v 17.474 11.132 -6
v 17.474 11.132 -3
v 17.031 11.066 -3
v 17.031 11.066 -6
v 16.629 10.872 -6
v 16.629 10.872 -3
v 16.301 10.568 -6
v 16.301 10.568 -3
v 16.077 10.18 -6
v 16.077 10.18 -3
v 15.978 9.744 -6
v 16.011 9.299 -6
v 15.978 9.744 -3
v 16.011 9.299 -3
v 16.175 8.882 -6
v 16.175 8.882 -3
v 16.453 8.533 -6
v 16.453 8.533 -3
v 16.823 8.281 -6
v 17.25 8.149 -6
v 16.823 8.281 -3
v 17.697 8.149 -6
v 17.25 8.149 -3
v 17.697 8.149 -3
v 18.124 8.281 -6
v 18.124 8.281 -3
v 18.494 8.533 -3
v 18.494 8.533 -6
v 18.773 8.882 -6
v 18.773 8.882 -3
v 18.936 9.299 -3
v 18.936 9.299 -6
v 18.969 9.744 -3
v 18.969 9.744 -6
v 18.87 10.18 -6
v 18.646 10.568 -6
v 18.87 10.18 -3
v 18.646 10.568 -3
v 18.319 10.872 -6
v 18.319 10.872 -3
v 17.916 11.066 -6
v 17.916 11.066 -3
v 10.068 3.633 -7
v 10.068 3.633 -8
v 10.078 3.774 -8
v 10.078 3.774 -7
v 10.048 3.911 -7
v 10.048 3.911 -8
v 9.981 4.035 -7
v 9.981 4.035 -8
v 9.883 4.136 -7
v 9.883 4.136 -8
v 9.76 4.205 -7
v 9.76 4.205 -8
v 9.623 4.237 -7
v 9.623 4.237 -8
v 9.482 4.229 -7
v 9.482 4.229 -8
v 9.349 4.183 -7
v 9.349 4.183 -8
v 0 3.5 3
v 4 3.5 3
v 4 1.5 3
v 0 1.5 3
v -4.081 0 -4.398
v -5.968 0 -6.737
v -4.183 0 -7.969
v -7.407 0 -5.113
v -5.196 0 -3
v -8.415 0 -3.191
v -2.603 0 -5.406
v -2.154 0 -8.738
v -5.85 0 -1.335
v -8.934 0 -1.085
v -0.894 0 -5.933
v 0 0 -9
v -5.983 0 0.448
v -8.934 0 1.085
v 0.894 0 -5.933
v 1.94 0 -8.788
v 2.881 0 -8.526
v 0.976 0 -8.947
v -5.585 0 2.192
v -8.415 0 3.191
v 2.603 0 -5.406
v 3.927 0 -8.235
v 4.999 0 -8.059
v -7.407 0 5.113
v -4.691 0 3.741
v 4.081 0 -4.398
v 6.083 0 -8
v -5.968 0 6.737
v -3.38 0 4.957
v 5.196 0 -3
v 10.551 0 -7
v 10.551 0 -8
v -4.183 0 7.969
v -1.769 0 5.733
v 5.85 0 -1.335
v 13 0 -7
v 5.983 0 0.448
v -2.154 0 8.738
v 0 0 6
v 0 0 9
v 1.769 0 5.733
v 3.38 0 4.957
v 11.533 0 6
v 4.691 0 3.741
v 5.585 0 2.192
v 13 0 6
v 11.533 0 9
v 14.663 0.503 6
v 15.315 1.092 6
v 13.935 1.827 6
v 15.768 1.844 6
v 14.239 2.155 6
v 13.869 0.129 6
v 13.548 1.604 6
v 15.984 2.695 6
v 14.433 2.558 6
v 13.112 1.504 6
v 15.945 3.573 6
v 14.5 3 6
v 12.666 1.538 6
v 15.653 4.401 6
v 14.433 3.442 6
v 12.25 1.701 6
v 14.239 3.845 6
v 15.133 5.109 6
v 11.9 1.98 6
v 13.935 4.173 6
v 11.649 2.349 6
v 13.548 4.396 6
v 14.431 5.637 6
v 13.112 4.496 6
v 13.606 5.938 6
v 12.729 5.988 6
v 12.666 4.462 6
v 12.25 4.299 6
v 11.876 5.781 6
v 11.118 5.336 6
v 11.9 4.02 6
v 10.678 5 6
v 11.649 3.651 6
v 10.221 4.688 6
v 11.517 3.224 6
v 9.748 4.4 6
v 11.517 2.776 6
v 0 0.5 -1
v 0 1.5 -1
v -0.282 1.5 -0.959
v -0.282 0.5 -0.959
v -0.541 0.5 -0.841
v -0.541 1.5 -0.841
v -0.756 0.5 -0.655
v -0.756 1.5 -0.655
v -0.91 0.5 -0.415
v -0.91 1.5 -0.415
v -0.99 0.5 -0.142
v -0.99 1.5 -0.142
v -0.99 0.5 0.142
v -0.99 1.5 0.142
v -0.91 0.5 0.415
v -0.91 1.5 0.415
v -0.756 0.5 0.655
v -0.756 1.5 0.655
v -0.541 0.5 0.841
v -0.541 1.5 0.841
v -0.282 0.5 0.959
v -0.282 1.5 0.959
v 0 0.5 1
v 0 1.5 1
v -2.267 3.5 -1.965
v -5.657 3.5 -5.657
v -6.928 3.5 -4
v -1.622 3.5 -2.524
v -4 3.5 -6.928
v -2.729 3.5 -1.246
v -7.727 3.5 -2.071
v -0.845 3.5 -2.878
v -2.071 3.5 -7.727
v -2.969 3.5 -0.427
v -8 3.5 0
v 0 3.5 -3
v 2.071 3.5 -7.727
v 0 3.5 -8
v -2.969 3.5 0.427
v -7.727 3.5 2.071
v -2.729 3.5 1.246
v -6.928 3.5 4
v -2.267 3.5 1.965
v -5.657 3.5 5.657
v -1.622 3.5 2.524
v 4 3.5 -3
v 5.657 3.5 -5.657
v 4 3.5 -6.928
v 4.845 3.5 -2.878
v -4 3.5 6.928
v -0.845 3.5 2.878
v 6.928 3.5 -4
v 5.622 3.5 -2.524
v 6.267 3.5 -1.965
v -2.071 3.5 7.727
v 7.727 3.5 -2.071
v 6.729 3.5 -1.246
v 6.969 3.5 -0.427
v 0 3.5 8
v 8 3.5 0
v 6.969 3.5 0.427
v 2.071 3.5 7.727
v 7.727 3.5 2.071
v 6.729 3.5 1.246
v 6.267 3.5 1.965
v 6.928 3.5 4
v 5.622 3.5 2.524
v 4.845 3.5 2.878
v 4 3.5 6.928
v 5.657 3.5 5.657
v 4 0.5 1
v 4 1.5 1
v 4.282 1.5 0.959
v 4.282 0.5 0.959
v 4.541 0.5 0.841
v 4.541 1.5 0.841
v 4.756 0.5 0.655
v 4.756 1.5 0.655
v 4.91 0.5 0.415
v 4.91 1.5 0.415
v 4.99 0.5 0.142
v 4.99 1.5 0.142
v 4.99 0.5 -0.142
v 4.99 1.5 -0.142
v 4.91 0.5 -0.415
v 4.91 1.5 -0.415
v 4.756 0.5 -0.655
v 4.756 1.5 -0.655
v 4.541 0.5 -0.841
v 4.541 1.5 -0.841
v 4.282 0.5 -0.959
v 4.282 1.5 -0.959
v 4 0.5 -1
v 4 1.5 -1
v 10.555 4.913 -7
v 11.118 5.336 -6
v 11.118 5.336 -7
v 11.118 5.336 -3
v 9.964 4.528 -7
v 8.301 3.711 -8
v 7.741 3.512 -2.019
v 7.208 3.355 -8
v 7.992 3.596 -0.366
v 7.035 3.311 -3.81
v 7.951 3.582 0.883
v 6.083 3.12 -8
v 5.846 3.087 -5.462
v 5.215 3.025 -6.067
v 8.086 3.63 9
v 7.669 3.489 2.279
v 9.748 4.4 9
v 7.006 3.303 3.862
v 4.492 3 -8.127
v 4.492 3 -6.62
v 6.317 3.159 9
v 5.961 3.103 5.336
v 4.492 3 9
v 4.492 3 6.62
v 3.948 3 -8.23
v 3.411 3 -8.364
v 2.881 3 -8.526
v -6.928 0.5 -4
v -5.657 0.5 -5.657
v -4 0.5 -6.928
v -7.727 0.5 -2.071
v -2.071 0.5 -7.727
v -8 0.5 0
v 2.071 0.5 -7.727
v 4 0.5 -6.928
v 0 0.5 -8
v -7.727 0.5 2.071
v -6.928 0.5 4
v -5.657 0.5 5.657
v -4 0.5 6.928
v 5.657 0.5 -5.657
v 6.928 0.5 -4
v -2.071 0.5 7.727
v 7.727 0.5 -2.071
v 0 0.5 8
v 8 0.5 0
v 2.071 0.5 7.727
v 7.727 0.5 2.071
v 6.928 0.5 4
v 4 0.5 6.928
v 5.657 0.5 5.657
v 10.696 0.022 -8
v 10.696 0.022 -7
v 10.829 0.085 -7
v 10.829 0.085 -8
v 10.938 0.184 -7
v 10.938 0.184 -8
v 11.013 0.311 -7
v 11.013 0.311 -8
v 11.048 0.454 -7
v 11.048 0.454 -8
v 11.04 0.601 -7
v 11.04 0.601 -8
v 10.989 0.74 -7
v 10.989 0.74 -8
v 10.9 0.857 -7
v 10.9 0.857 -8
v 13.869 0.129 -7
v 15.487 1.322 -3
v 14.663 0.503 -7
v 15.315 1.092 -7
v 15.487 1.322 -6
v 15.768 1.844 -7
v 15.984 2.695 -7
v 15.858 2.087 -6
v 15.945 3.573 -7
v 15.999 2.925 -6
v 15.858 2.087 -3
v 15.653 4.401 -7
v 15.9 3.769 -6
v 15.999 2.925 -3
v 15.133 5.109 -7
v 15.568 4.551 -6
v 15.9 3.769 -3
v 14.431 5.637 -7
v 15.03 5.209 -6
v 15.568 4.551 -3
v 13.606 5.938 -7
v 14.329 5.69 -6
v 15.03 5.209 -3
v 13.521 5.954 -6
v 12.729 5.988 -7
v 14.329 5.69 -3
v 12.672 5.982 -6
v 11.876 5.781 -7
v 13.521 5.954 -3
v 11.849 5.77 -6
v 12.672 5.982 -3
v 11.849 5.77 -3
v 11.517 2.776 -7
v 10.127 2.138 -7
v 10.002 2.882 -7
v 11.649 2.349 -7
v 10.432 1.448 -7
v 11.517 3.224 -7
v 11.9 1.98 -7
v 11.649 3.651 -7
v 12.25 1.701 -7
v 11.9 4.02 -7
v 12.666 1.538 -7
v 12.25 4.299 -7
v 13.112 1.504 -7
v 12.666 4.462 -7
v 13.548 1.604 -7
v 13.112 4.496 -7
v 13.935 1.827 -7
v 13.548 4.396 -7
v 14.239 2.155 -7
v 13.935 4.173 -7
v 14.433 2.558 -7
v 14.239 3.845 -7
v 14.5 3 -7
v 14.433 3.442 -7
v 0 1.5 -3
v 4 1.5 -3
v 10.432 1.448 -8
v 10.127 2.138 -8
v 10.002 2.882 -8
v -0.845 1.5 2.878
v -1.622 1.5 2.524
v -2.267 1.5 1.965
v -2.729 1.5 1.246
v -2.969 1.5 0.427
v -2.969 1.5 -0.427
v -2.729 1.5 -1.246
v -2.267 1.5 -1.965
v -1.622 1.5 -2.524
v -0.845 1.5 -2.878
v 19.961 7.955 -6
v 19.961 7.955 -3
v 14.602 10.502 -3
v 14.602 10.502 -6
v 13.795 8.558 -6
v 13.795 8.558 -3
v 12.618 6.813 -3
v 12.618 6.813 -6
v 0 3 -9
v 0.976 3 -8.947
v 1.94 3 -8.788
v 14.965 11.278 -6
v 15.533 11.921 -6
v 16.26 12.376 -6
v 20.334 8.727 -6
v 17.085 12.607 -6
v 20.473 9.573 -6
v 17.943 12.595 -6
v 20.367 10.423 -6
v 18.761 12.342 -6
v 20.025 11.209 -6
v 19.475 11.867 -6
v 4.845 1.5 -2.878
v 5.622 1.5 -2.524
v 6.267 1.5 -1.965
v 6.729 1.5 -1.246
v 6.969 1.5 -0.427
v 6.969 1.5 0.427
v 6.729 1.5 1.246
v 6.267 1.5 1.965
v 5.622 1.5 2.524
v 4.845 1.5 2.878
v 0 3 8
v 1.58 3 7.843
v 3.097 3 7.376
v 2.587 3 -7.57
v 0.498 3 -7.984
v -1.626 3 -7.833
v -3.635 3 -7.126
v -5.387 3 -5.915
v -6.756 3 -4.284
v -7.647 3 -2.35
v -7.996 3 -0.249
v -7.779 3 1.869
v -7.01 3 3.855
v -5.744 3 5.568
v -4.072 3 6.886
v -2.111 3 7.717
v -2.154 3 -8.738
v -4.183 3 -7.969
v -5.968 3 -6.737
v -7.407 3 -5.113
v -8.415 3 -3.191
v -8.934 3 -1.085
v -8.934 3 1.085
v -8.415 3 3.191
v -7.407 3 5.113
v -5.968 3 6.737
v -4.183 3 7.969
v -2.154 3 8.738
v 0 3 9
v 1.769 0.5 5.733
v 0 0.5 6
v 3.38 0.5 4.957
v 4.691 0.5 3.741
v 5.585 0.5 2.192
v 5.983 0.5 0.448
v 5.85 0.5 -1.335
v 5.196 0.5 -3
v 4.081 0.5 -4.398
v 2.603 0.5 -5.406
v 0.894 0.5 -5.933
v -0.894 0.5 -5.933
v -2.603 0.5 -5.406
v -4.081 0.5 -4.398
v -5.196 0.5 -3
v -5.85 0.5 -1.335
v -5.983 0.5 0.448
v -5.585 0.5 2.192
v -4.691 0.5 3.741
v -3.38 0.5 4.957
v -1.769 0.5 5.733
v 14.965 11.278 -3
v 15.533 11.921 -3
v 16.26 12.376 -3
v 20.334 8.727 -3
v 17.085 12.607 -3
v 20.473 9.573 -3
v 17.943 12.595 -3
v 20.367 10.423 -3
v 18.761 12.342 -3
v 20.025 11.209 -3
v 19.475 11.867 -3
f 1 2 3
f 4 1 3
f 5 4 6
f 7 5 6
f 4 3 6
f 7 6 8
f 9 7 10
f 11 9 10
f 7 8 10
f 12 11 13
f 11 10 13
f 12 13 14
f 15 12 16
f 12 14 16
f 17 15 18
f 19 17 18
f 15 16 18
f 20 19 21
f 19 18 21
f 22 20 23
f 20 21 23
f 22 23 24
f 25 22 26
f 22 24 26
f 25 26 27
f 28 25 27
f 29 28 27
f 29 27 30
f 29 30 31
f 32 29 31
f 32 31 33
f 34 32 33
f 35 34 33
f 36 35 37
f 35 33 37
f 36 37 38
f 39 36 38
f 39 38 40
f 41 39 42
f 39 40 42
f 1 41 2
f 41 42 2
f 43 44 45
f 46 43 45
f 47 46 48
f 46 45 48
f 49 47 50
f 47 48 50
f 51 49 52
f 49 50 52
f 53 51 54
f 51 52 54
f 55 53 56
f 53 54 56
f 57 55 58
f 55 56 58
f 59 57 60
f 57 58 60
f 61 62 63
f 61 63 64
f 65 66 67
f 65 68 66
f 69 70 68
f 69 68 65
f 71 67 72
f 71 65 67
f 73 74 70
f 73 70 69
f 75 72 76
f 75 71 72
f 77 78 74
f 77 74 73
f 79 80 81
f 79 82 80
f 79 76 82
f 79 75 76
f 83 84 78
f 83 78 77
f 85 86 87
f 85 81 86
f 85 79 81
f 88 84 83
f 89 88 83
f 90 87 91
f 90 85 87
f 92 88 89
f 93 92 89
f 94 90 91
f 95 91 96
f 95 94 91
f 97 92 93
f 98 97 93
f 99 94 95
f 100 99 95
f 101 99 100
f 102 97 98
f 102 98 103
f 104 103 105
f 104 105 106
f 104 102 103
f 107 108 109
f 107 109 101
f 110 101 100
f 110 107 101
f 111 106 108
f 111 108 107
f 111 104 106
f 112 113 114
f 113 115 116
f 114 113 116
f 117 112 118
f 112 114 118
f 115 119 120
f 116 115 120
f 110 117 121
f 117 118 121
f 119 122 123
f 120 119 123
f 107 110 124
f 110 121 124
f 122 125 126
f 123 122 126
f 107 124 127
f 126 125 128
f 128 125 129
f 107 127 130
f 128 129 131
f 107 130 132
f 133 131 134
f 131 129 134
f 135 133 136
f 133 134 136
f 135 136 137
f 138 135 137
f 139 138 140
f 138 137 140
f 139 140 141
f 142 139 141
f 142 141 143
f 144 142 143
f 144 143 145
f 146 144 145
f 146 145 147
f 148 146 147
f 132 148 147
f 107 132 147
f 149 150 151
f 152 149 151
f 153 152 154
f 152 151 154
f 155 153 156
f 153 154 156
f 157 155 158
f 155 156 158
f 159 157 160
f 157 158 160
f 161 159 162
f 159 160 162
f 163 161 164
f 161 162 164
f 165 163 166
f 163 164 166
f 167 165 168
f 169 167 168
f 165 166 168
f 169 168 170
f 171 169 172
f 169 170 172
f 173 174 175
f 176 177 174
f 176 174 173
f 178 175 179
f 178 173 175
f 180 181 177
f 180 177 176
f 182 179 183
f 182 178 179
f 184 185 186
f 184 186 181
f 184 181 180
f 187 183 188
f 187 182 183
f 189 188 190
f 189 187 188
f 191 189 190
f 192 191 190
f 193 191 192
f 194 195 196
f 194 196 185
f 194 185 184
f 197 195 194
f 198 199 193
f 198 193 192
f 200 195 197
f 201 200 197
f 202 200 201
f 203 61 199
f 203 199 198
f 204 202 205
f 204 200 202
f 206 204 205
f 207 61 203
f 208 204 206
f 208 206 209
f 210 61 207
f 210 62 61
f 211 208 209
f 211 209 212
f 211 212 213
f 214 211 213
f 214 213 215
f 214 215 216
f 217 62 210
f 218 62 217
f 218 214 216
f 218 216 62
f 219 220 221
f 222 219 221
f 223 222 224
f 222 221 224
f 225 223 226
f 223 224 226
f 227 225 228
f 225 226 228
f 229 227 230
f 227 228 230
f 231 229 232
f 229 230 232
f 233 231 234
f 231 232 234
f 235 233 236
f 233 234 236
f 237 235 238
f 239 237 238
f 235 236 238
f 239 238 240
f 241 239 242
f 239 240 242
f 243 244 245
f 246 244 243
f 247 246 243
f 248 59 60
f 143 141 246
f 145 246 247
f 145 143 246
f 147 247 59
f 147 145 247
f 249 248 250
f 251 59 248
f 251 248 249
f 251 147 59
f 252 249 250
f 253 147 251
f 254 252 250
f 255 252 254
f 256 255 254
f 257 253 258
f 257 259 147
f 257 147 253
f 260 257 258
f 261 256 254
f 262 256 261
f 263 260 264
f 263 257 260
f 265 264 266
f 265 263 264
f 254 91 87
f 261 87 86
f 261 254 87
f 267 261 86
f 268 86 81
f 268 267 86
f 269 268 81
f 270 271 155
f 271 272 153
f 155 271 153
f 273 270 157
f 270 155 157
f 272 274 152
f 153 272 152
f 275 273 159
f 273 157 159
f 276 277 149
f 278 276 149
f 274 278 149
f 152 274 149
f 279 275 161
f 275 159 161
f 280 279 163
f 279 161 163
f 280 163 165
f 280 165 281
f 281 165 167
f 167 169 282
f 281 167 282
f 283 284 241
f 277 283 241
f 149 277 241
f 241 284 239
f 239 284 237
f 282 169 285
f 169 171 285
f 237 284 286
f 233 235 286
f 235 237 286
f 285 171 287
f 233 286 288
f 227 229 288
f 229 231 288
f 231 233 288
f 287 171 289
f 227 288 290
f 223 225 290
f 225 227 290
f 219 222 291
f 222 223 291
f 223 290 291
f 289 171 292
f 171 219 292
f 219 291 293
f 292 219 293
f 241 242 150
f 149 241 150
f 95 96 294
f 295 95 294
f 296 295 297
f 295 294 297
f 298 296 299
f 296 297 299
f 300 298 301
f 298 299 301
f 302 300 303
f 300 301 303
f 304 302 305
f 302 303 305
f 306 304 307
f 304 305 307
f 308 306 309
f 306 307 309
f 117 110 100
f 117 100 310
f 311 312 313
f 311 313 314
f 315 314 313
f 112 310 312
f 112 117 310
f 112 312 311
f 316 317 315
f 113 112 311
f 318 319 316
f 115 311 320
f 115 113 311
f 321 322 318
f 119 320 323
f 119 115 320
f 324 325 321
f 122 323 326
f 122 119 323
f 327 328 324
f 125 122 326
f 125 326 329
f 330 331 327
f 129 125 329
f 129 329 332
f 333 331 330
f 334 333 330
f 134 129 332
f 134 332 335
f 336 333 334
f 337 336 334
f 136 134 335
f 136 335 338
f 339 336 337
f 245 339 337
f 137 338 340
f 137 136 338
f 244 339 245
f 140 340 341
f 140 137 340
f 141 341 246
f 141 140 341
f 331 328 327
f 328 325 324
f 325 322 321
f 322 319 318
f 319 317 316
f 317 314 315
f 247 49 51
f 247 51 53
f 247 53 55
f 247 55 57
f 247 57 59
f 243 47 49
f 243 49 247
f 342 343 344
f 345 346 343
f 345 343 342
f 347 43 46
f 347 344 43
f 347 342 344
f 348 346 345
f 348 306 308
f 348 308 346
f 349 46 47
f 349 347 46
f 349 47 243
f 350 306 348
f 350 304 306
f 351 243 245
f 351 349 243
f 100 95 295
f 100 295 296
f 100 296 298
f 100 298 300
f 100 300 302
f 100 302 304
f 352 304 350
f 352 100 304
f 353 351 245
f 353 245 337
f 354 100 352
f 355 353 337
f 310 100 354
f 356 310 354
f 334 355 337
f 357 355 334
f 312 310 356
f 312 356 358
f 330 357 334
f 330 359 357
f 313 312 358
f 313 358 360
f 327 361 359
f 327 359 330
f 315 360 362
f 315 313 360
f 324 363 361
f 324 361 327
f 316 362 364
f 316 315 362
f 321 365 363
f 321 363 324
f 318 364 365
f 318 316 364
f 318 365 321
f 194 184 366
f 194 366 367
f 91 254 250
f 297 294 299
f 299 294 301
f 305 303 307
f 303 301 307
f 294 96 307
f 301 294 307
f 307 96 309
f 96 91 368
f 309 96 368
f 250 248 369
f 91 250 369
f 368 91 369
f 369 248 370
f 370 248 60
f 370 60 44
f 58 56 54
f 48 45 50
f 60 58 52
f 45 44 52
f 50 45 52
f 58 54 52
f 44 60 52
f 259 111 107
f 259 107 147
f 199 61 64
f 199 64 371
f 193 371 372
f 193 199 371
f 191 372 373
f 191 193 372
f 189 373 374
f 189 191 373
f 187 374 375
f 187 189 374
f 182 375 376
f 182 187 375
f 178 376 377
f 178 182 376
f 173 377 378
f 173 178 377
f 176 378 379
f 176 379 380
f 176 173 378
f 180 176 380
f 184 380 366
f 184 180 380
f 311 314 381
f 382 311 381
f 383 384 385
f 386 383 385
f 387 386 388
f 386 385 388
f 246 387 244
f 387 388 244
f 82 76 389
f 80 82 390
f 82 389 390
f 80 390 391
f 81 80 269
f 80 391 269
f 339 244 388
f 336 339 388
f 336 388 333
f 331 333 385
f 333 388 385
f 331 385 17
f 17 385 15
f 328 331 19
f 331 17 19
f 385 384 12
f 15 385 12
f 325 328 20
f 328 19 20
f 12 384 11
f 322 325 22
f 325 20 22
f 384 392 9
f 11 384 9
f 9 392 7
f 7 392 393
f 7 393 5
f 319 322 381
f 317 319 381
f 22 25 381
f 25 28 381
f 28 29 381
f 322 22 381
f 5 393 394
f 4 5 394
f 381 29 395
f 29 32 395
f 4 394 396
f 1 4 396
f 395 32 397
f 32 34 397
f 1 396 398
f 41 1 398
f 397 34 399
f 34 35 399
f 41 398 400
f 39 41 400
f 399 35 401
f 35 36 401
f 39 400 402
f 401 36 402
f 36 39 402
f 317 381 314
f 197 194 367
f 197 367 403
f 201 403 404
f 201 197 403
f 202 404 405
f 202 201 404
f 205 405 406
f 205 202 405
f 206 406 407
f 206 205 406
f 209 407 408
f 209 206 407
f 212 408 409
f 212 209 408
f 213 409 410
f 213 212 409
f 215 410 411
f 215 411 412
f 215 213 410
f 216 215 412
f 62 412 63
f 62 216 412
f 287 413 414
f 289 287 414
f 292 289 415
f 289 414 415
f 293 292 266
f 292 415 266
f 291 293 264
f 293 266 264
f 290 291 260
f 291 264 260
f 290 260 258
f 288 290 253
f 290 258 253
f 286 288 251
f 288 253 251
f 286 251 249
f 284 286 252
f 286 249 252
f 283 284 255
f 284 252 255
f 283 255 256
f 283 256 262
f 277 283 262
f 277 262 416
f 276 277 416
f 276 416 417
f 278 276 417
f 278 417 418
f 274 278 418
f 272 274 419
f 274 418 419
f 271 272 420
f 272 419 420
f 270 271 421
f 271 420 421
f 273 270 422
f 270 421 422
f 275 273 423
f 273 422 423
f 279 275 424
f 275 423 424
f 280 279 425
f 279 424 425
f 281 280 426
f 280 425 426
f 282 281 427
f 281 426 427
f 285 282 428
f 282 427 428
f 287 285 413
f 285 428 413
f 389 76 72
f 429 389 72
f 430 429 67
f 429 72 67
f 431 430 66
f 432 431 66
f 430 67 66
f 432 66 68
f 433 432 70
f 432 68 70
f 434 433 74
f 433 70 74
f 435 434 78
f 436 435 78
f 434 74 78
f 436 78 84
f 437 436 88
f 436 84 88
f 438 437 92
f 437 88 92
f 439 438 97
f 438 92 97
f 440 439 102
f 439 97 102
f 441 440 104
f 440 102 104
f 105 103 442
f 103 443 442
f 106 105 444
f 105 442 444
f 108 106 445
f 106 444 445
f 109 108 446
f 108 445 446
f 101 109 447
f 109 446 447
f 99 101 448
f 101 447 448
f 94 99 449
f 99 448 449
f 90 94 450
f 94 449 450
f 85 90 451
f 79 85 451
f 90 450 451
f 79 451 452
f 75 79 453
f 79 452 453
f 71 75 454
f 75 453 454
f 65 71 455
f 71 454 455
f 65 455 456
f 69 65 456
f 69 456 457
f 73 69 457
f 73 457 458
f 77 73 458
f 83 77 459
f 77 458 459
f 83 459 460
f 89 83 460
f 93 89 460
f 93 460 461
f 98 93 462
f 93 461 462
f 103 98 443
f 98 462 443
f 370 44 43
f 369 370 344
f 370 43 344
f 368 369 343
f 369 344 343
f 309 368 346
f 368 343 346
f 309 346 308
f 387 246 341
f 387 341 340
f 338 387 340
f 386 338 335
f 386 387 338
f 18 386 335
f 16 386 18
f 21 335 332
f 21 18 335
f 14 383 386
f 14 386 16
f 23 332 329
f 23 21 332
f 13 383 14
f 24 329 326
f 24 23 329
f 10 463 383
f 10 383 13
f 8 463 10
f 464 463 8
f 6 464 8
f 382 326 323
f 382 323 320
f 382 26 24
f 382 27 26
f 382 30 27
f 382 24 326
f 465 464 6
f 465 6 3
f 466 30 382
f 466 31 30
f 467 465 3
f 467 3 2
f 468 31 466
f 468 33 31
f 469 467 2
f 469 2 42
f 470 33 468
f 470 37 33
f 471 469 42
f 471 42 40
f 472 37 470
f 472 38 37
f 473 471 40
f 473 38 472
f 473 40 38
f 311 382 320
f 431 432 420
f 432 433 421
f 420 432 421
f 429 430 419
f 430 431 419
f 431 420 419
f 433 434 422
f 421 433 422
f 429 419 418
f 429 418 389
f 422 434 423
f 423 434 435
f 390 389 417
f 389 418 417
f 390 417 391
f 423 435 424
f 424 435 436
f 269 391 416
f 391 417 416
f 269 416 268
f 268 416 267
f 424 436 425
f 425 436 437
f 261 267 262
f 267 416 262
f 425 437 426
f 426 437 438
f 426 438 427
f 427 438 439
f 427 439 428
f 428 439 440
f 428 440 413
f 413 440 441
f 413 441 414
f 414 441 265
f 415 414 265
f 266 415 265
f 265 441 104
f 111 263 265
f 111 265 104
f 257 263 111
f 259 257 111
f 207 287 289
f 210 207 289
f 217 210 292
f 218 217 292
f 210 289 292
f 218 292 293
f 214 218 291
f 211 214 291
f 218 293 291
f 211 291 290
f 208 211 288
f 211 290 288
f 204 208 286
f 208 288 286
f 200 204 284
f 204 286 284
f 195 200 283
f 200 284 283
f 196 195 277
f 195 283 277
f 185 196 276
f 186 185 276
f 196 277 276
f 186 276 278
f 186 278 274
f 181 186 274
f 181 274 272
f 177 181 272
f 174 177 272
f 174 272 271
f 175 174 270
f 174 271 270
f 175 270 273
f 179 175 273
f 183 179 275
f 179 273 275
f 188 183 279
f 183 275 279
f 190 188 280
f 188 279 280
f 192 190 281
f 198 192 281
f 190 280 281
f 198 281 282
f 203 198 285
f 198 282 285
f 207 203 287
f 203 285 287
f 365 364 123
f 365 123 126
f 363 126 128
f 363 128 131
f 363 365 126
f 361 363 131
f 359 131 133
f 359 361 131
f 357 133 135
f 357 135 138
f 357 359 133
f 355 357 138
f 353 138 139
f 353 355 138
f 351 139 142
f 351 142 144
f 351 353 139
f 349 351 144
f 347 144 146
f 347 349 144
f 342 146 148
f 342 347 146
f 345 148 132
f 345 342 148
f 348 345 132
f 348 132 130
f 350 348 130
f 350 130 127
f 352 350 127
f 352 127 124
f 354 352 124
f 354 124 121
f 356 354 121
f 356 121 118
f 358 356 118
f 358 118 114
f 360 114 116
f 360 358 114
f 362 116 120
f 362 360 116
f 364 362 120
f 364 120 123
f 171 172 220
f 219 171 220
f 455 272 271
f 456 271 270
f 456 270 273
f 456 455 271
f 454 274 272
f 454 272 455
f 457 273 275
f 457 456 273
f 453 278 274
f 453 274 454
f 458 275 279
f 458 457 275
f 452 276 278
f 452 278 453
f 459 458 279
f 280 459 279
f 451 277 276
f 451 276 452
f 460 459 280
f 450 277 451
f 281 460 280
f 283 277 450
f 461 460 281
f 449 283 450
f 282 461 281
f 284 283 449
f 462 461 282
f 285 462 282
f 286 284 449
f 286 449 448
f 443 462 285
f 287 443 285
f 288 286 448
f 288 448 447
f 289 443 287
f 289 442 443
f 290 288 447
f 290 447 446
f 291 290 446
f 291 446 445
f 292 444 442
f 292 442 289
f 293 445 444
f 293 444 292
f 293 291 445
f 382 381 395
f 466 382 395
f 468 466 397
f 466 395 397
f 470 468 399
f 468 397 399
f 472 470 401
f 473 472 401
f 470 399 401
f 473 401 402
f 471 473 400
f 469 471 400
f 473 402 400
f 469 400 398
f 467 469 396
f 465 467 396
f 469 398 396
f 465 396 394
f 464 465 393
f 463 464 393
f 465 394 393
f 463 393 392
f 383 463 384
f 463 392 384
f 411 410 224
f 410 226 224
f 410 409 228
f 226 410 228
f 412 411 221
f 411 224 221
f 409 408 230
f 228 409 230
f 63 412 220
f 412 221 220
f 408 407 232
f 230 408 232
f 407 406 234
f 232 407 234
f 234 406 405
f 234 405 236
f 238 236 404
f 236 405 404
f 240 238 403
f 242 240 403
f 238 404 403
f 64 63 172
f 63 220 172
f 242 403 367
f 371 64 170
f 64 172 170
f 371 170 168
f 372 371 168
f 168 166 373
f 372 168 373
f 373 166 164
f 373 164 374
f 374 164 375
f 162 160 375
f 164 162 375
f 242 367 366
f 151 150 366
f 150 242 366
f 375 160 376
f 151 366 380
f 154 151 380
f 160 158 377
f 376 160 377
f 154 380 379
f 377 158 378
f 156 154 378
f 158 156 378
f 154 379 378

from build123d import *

# Parameters (mm, degrees)
SKETCH1_R           = 9
BOSS_EXTRUDE1_DEPTH = 3
SKETCH2_W           = 4.492348724
SKETCH2_H           = 3
BOSS_EXTRUDE2_DEPTH = 9
CUT_EXTRUDE1_DEPTH  = 8
BOSS_EXTRUDE6_START = -6
BOSS_EXTRUDE6_DEPTH = 3
FILLET1_R           = 10
SKETCH4_R           = 3
CUT_EXTRUDE2_DEPTH  = 1
SKETCH5_R           = 8
CUT_EXTRUDE3_DEPTH  = 2.5
SKETCH6_R           = 6
CUT_EXTRUDE4_DEPTH  = 2.5
CUT_EXTRUDE5_DEPTH  = 3
HOLE1_START         = -7
HOLE1_OUTLINE_R     = 1.5
HOLE1_DEPTH         = 13
SKETCH13_W          = 1.5
SKETCH13_H          = 15
SKETCH14_R          = 8
BOSS_EXTRUDE5_DEPTH = 3
CUT_EXTRUDE6_DEPTH  = 2
CUT_EXTRUDE7_DEPTH  = 2
FILLET5_R           = 0.5


with BuildPart() as part:
    # Sketch1 → Boss-Extrude1 (new body)
    with BuildSketch(Plane(origin=(0, 0, 0), x_dir=(1, 0, 0), z_dir=(0, 1, 0))):
        with Locations(Location((0, 0, 0), (0, 0, 270))):
            Circle(SKETCH1_R)
    extrude(amount=BOSS_EXTRUDE1_DEPTH)

    # Sketch2 → Boss-Extrude2 (add, symmetric)
    with BuildSketch(Plane.XY):
        with BuildLine():
            ThreePointArc((11.118241852, 5.336447362), (8.005233793, 3.601221323), (4.492348724, 3))
            Line((4.492348724, 3), (4.492348724, 0))
            Line((4.492348724, 0), (13, 0))
            ThreePointArc((13, 0), (10.170747264, 2.002338255), (11.118241852, 5.336447362))
        make_face()
        with BuildLine():
            ThreePointArc((16, 3), (14.29513041, 5.70603718), (11.118241852, 5.336447362))
            ThreePointArc((11.118241852, 5.336447362), (10.170747264, 2.002338255), (13, 0))
            ThreePointArc((13, 0), (14.408414688, 0.351157221), (15.487112718, 1.32242129))
            ThreePointArc((15.487112718, 1.32242129), (15.868914268, 2.122884886), (16, 3))
        make_face()
        with Locations((2.246174362, 1.5)):
            Rectangle(SKETCH2_W, SKETCH2_H)
    extrude(amount=BOSS_EXTRUDE2_DEPTH, both=True)

    # Sketch3 → Cut-Extrude1 (cut, symmetric)
    with BuildSketch(Plane(origin=(0, 3, 0), x_dir=(1, 0, 0), z_dir=(0, 1, 0))):
        with BuildLine():
            ThreePointArc((0, 9), (2.121320344, 8.746427842), (4.123105626, 8))
            Line((4.123105626, 8), (20.22341573, 8))
            Line((20.22341573, 8), (20.22341573, 9))
            Line((20.22341573, 9), (0, 9))
        make_face()
    extrude(amount=CUT_EXTRUDE1_DEPTH, both=True, mode=Mode.SUBTRACT)

    # Sketch2<3> → Boss-Extrude6 (add)
    with BuildSketch(Plane.XY.offset(BOSS_EXTRUDE6_START)):
        with BuildLine():
            ThreePointArc((14.602307947, 10.501787764), (13.249766942, 7.656401863), (11.118241852, 5.336447362))
            ThreePointArc((11.118241852, 5.336447362), (15.029708074, 5.20913674), (15.487112718, 1.32242129))
            Line((15.487112718, 1.32242129), (19.960655945, 7.95472187))
            ThreePointArc((19.960655945, 7.95472187), (18.761477117, 12.341770325), (14.602307947, 10.501787764))
        make_face()
    extrude(amount=BOSS_EXTRUDE6_DEPTH)

    # Fillet1
    fillet1_edges = [part.edges().sort_by_distance(p)[0] for p in [
        (4.123105626, 1.5, -8),
    ]]
    fillet(fillet1_edges, radius=FILLET1_R)

    # Sketch4 → Cut-Extrude2 (cut, symmetric)
    with BuildSketch(Plane.XY.offset(-8)):
        with Locations((13, 3)):
            Circle(SKETCH4_R)
    extrude(amount=CUT_EXTRUDE2_DEPTH, both=True, mode=Mode.SUBTRACT)

    # Sketch5 → Cut-Extrude3 (cut, symmetric)
    with BuildSketch(Plane(origin=(0, 3, 0), x_dir=(1, 0, 0), z_dir=(0, 1, 0))):
        with Locations(Location((0, 0, 0), (0, 0, 270))):
            Circle(SKETCH5_R)
    extrude(amount=CUT_EXTRUDE3_DEPTH, both=True, mode=Mode.SUBTRACT)

    # Sketch6 → Cut-Extrude4 (cut, symmetric)
    with BuildSketch(Plane(origin=(0, 0.5, 0), x_dir=(1, 0, 0), z_dir=(0, 1, 0))):
        with Locations(Location((0, 0, 0), (0, 0, 270))):
            Circle(SKETCH6_R)
    extrude(amount=CUT_EXTRUDE4_DEPTH, both=True, mode=Mode.SUBTRACT)

    # Sketch7 → Cut-Extrude5 (cut)
    with BuildSketch(Plane(origin=(0, 0, 9), x_dir=(-1, 0, 0), z_dir=(0, 0, -1))):
        with BuildLine():
            Line((-13, 0), (-11.53289423, 0))
            Line((-11.53289423, 0), (-9.747506928, 4.399961457))
            ThreePointArc((-9.747506928, 4.399961457), (-10.451299694, 4.841235284), (-11.118241854, 5.336447363))
            ThreePointArc((-11.118241854, 5.336447363), (-15.829252736, 3.997661744), (-13, 0))
        make_face()
    extrude(amount=CUT_EXTRUDE5_DEPTH, mode=Mode.SUBTRACT)

    # Hole1: read off the stored shape, not the designer's step
    # Hole1 outline → Hole1 (cut)
    with BuildSketch(Plane.XY.offset(HOLE1_START)):
        with Locations((13, 3)):
            Circle(HOLE1_OUTLINE_R)
    extrude(amount=HOLE1_DEPTH, mode=Mode.SUBTRACT)

    # Sketch13 → Ø3.0 mm Dowel Holes1 (revolve, cut)
    with BuildSketch(Plane(origin=(17.473543228, 9.63230058, -6), x_dir=(0, 1, 0), z_dir=(1, 0, 0))):
        with Locations((0.75, 7.5)):
            Rectangle(SKETCH13_W, SKETCH13_H)
    revolve(axis=Axis((17.473543228, 9.63230058, -12.35), (0, 0, 1)), mode=Mode.SUBTRACT)

    # Fillet5
    # the kernel refuses this fillet: 0.5 mm, written as the material it takes off along each edge
    with BuildSketch(Plane(origin=(13, 0, -14.123724357), x_dir=(-1, 0, 0), z_dir=(0, 0, 1))) as fillet5_piece_1:
        with BuildLine():
            CenterArc((2.449489743, -0.5), FILLET5_R, 90, 135.584691403)
            ThreePointArc((2.099562637, -0.857142857), (1.133893419, -0.222539701), (0, 0))
            Line((0, 0), (2.449489743, 0))
        make_face()
    extrude(amount=7.123724357, mode=Mode.SUBTRACT)
    with BuildSketch(Plane(origin=(11.118241852, 5.336447362, -13.280688141), x_dir=(-0.524989604384867, -0.8511086389455936, 0), z_dir=(0, 0, 1))) as fillet5_piece_2:
        with BuildLine():
            CenterArc((2.168111982, -0.471365199), FILLET5_R, 109.484734083, 129.554348195)
            ThreePointArc((1.910885347, -0.900124407), (0.977998077, -0.402179055), (0, 0))
            ThreePointArc((0, 0), (1.000667069, -0.171808808), (2.001334137, 0))
        make_face()
    extrude(amount=6.280688141, mode=Mode.SUBTRACT)


with BuildPart() as body_2:
    # Sketch14 → Boss-Extrude5 (new body)
    with BuildSketch(Plane(origin=(0, 0.5, 0), x_dir=(1, 0, 0), z_dir=(0, 1, 0))):
        with Locations(Location((0, 0, 0), (0, 0, 270))):
            Circle(SKETCH14_R)
    extrude(amount=BOSS_EXTRUDE5_DEPTH)

    # Sketch15 → Cut-Extrude6 (cut)
    with BuildSketch(Plane(origin=(0, 3.5, 0), x_dir=(1, 0, 0), z_dir=(0, 1, 0))):
        with BuildLine():
            Line((0, 3), (4, 3))
            ThreePointArc((4, 3), (7, 0), (4, -3))
            Line((4, -3), (0, -3))
            ThreePointArc((0, -3), (-3, 0), (0, 3))
        make_face()
    extrude(amount=-CUT_EXTRUDE6_DEPTH, mode=Mode.SUBTRACT)

    # Sketch17 → Cut-Extrude7 (cut)
    with BuildSketch(Plane(origin=(0, 1.5, 0), x_dir=(1, 0, 0), z_dir=(0, 1, 0))):
        with BuildLine():
            Line((0, -1), (4, -1))
            ThreePointArc((4, -1), (5, 0), (4, 1))
            Line((4, 1), (0, 1))
            ThreePointArc((0, 1), (-1, 0), (0, -1))
        make_face()
    extrude(amount=-CUT_EXTRUDE7_DEPTH, mode=Mode.SUBTRACT)


solid = Compound([part.part, body_2.part])
